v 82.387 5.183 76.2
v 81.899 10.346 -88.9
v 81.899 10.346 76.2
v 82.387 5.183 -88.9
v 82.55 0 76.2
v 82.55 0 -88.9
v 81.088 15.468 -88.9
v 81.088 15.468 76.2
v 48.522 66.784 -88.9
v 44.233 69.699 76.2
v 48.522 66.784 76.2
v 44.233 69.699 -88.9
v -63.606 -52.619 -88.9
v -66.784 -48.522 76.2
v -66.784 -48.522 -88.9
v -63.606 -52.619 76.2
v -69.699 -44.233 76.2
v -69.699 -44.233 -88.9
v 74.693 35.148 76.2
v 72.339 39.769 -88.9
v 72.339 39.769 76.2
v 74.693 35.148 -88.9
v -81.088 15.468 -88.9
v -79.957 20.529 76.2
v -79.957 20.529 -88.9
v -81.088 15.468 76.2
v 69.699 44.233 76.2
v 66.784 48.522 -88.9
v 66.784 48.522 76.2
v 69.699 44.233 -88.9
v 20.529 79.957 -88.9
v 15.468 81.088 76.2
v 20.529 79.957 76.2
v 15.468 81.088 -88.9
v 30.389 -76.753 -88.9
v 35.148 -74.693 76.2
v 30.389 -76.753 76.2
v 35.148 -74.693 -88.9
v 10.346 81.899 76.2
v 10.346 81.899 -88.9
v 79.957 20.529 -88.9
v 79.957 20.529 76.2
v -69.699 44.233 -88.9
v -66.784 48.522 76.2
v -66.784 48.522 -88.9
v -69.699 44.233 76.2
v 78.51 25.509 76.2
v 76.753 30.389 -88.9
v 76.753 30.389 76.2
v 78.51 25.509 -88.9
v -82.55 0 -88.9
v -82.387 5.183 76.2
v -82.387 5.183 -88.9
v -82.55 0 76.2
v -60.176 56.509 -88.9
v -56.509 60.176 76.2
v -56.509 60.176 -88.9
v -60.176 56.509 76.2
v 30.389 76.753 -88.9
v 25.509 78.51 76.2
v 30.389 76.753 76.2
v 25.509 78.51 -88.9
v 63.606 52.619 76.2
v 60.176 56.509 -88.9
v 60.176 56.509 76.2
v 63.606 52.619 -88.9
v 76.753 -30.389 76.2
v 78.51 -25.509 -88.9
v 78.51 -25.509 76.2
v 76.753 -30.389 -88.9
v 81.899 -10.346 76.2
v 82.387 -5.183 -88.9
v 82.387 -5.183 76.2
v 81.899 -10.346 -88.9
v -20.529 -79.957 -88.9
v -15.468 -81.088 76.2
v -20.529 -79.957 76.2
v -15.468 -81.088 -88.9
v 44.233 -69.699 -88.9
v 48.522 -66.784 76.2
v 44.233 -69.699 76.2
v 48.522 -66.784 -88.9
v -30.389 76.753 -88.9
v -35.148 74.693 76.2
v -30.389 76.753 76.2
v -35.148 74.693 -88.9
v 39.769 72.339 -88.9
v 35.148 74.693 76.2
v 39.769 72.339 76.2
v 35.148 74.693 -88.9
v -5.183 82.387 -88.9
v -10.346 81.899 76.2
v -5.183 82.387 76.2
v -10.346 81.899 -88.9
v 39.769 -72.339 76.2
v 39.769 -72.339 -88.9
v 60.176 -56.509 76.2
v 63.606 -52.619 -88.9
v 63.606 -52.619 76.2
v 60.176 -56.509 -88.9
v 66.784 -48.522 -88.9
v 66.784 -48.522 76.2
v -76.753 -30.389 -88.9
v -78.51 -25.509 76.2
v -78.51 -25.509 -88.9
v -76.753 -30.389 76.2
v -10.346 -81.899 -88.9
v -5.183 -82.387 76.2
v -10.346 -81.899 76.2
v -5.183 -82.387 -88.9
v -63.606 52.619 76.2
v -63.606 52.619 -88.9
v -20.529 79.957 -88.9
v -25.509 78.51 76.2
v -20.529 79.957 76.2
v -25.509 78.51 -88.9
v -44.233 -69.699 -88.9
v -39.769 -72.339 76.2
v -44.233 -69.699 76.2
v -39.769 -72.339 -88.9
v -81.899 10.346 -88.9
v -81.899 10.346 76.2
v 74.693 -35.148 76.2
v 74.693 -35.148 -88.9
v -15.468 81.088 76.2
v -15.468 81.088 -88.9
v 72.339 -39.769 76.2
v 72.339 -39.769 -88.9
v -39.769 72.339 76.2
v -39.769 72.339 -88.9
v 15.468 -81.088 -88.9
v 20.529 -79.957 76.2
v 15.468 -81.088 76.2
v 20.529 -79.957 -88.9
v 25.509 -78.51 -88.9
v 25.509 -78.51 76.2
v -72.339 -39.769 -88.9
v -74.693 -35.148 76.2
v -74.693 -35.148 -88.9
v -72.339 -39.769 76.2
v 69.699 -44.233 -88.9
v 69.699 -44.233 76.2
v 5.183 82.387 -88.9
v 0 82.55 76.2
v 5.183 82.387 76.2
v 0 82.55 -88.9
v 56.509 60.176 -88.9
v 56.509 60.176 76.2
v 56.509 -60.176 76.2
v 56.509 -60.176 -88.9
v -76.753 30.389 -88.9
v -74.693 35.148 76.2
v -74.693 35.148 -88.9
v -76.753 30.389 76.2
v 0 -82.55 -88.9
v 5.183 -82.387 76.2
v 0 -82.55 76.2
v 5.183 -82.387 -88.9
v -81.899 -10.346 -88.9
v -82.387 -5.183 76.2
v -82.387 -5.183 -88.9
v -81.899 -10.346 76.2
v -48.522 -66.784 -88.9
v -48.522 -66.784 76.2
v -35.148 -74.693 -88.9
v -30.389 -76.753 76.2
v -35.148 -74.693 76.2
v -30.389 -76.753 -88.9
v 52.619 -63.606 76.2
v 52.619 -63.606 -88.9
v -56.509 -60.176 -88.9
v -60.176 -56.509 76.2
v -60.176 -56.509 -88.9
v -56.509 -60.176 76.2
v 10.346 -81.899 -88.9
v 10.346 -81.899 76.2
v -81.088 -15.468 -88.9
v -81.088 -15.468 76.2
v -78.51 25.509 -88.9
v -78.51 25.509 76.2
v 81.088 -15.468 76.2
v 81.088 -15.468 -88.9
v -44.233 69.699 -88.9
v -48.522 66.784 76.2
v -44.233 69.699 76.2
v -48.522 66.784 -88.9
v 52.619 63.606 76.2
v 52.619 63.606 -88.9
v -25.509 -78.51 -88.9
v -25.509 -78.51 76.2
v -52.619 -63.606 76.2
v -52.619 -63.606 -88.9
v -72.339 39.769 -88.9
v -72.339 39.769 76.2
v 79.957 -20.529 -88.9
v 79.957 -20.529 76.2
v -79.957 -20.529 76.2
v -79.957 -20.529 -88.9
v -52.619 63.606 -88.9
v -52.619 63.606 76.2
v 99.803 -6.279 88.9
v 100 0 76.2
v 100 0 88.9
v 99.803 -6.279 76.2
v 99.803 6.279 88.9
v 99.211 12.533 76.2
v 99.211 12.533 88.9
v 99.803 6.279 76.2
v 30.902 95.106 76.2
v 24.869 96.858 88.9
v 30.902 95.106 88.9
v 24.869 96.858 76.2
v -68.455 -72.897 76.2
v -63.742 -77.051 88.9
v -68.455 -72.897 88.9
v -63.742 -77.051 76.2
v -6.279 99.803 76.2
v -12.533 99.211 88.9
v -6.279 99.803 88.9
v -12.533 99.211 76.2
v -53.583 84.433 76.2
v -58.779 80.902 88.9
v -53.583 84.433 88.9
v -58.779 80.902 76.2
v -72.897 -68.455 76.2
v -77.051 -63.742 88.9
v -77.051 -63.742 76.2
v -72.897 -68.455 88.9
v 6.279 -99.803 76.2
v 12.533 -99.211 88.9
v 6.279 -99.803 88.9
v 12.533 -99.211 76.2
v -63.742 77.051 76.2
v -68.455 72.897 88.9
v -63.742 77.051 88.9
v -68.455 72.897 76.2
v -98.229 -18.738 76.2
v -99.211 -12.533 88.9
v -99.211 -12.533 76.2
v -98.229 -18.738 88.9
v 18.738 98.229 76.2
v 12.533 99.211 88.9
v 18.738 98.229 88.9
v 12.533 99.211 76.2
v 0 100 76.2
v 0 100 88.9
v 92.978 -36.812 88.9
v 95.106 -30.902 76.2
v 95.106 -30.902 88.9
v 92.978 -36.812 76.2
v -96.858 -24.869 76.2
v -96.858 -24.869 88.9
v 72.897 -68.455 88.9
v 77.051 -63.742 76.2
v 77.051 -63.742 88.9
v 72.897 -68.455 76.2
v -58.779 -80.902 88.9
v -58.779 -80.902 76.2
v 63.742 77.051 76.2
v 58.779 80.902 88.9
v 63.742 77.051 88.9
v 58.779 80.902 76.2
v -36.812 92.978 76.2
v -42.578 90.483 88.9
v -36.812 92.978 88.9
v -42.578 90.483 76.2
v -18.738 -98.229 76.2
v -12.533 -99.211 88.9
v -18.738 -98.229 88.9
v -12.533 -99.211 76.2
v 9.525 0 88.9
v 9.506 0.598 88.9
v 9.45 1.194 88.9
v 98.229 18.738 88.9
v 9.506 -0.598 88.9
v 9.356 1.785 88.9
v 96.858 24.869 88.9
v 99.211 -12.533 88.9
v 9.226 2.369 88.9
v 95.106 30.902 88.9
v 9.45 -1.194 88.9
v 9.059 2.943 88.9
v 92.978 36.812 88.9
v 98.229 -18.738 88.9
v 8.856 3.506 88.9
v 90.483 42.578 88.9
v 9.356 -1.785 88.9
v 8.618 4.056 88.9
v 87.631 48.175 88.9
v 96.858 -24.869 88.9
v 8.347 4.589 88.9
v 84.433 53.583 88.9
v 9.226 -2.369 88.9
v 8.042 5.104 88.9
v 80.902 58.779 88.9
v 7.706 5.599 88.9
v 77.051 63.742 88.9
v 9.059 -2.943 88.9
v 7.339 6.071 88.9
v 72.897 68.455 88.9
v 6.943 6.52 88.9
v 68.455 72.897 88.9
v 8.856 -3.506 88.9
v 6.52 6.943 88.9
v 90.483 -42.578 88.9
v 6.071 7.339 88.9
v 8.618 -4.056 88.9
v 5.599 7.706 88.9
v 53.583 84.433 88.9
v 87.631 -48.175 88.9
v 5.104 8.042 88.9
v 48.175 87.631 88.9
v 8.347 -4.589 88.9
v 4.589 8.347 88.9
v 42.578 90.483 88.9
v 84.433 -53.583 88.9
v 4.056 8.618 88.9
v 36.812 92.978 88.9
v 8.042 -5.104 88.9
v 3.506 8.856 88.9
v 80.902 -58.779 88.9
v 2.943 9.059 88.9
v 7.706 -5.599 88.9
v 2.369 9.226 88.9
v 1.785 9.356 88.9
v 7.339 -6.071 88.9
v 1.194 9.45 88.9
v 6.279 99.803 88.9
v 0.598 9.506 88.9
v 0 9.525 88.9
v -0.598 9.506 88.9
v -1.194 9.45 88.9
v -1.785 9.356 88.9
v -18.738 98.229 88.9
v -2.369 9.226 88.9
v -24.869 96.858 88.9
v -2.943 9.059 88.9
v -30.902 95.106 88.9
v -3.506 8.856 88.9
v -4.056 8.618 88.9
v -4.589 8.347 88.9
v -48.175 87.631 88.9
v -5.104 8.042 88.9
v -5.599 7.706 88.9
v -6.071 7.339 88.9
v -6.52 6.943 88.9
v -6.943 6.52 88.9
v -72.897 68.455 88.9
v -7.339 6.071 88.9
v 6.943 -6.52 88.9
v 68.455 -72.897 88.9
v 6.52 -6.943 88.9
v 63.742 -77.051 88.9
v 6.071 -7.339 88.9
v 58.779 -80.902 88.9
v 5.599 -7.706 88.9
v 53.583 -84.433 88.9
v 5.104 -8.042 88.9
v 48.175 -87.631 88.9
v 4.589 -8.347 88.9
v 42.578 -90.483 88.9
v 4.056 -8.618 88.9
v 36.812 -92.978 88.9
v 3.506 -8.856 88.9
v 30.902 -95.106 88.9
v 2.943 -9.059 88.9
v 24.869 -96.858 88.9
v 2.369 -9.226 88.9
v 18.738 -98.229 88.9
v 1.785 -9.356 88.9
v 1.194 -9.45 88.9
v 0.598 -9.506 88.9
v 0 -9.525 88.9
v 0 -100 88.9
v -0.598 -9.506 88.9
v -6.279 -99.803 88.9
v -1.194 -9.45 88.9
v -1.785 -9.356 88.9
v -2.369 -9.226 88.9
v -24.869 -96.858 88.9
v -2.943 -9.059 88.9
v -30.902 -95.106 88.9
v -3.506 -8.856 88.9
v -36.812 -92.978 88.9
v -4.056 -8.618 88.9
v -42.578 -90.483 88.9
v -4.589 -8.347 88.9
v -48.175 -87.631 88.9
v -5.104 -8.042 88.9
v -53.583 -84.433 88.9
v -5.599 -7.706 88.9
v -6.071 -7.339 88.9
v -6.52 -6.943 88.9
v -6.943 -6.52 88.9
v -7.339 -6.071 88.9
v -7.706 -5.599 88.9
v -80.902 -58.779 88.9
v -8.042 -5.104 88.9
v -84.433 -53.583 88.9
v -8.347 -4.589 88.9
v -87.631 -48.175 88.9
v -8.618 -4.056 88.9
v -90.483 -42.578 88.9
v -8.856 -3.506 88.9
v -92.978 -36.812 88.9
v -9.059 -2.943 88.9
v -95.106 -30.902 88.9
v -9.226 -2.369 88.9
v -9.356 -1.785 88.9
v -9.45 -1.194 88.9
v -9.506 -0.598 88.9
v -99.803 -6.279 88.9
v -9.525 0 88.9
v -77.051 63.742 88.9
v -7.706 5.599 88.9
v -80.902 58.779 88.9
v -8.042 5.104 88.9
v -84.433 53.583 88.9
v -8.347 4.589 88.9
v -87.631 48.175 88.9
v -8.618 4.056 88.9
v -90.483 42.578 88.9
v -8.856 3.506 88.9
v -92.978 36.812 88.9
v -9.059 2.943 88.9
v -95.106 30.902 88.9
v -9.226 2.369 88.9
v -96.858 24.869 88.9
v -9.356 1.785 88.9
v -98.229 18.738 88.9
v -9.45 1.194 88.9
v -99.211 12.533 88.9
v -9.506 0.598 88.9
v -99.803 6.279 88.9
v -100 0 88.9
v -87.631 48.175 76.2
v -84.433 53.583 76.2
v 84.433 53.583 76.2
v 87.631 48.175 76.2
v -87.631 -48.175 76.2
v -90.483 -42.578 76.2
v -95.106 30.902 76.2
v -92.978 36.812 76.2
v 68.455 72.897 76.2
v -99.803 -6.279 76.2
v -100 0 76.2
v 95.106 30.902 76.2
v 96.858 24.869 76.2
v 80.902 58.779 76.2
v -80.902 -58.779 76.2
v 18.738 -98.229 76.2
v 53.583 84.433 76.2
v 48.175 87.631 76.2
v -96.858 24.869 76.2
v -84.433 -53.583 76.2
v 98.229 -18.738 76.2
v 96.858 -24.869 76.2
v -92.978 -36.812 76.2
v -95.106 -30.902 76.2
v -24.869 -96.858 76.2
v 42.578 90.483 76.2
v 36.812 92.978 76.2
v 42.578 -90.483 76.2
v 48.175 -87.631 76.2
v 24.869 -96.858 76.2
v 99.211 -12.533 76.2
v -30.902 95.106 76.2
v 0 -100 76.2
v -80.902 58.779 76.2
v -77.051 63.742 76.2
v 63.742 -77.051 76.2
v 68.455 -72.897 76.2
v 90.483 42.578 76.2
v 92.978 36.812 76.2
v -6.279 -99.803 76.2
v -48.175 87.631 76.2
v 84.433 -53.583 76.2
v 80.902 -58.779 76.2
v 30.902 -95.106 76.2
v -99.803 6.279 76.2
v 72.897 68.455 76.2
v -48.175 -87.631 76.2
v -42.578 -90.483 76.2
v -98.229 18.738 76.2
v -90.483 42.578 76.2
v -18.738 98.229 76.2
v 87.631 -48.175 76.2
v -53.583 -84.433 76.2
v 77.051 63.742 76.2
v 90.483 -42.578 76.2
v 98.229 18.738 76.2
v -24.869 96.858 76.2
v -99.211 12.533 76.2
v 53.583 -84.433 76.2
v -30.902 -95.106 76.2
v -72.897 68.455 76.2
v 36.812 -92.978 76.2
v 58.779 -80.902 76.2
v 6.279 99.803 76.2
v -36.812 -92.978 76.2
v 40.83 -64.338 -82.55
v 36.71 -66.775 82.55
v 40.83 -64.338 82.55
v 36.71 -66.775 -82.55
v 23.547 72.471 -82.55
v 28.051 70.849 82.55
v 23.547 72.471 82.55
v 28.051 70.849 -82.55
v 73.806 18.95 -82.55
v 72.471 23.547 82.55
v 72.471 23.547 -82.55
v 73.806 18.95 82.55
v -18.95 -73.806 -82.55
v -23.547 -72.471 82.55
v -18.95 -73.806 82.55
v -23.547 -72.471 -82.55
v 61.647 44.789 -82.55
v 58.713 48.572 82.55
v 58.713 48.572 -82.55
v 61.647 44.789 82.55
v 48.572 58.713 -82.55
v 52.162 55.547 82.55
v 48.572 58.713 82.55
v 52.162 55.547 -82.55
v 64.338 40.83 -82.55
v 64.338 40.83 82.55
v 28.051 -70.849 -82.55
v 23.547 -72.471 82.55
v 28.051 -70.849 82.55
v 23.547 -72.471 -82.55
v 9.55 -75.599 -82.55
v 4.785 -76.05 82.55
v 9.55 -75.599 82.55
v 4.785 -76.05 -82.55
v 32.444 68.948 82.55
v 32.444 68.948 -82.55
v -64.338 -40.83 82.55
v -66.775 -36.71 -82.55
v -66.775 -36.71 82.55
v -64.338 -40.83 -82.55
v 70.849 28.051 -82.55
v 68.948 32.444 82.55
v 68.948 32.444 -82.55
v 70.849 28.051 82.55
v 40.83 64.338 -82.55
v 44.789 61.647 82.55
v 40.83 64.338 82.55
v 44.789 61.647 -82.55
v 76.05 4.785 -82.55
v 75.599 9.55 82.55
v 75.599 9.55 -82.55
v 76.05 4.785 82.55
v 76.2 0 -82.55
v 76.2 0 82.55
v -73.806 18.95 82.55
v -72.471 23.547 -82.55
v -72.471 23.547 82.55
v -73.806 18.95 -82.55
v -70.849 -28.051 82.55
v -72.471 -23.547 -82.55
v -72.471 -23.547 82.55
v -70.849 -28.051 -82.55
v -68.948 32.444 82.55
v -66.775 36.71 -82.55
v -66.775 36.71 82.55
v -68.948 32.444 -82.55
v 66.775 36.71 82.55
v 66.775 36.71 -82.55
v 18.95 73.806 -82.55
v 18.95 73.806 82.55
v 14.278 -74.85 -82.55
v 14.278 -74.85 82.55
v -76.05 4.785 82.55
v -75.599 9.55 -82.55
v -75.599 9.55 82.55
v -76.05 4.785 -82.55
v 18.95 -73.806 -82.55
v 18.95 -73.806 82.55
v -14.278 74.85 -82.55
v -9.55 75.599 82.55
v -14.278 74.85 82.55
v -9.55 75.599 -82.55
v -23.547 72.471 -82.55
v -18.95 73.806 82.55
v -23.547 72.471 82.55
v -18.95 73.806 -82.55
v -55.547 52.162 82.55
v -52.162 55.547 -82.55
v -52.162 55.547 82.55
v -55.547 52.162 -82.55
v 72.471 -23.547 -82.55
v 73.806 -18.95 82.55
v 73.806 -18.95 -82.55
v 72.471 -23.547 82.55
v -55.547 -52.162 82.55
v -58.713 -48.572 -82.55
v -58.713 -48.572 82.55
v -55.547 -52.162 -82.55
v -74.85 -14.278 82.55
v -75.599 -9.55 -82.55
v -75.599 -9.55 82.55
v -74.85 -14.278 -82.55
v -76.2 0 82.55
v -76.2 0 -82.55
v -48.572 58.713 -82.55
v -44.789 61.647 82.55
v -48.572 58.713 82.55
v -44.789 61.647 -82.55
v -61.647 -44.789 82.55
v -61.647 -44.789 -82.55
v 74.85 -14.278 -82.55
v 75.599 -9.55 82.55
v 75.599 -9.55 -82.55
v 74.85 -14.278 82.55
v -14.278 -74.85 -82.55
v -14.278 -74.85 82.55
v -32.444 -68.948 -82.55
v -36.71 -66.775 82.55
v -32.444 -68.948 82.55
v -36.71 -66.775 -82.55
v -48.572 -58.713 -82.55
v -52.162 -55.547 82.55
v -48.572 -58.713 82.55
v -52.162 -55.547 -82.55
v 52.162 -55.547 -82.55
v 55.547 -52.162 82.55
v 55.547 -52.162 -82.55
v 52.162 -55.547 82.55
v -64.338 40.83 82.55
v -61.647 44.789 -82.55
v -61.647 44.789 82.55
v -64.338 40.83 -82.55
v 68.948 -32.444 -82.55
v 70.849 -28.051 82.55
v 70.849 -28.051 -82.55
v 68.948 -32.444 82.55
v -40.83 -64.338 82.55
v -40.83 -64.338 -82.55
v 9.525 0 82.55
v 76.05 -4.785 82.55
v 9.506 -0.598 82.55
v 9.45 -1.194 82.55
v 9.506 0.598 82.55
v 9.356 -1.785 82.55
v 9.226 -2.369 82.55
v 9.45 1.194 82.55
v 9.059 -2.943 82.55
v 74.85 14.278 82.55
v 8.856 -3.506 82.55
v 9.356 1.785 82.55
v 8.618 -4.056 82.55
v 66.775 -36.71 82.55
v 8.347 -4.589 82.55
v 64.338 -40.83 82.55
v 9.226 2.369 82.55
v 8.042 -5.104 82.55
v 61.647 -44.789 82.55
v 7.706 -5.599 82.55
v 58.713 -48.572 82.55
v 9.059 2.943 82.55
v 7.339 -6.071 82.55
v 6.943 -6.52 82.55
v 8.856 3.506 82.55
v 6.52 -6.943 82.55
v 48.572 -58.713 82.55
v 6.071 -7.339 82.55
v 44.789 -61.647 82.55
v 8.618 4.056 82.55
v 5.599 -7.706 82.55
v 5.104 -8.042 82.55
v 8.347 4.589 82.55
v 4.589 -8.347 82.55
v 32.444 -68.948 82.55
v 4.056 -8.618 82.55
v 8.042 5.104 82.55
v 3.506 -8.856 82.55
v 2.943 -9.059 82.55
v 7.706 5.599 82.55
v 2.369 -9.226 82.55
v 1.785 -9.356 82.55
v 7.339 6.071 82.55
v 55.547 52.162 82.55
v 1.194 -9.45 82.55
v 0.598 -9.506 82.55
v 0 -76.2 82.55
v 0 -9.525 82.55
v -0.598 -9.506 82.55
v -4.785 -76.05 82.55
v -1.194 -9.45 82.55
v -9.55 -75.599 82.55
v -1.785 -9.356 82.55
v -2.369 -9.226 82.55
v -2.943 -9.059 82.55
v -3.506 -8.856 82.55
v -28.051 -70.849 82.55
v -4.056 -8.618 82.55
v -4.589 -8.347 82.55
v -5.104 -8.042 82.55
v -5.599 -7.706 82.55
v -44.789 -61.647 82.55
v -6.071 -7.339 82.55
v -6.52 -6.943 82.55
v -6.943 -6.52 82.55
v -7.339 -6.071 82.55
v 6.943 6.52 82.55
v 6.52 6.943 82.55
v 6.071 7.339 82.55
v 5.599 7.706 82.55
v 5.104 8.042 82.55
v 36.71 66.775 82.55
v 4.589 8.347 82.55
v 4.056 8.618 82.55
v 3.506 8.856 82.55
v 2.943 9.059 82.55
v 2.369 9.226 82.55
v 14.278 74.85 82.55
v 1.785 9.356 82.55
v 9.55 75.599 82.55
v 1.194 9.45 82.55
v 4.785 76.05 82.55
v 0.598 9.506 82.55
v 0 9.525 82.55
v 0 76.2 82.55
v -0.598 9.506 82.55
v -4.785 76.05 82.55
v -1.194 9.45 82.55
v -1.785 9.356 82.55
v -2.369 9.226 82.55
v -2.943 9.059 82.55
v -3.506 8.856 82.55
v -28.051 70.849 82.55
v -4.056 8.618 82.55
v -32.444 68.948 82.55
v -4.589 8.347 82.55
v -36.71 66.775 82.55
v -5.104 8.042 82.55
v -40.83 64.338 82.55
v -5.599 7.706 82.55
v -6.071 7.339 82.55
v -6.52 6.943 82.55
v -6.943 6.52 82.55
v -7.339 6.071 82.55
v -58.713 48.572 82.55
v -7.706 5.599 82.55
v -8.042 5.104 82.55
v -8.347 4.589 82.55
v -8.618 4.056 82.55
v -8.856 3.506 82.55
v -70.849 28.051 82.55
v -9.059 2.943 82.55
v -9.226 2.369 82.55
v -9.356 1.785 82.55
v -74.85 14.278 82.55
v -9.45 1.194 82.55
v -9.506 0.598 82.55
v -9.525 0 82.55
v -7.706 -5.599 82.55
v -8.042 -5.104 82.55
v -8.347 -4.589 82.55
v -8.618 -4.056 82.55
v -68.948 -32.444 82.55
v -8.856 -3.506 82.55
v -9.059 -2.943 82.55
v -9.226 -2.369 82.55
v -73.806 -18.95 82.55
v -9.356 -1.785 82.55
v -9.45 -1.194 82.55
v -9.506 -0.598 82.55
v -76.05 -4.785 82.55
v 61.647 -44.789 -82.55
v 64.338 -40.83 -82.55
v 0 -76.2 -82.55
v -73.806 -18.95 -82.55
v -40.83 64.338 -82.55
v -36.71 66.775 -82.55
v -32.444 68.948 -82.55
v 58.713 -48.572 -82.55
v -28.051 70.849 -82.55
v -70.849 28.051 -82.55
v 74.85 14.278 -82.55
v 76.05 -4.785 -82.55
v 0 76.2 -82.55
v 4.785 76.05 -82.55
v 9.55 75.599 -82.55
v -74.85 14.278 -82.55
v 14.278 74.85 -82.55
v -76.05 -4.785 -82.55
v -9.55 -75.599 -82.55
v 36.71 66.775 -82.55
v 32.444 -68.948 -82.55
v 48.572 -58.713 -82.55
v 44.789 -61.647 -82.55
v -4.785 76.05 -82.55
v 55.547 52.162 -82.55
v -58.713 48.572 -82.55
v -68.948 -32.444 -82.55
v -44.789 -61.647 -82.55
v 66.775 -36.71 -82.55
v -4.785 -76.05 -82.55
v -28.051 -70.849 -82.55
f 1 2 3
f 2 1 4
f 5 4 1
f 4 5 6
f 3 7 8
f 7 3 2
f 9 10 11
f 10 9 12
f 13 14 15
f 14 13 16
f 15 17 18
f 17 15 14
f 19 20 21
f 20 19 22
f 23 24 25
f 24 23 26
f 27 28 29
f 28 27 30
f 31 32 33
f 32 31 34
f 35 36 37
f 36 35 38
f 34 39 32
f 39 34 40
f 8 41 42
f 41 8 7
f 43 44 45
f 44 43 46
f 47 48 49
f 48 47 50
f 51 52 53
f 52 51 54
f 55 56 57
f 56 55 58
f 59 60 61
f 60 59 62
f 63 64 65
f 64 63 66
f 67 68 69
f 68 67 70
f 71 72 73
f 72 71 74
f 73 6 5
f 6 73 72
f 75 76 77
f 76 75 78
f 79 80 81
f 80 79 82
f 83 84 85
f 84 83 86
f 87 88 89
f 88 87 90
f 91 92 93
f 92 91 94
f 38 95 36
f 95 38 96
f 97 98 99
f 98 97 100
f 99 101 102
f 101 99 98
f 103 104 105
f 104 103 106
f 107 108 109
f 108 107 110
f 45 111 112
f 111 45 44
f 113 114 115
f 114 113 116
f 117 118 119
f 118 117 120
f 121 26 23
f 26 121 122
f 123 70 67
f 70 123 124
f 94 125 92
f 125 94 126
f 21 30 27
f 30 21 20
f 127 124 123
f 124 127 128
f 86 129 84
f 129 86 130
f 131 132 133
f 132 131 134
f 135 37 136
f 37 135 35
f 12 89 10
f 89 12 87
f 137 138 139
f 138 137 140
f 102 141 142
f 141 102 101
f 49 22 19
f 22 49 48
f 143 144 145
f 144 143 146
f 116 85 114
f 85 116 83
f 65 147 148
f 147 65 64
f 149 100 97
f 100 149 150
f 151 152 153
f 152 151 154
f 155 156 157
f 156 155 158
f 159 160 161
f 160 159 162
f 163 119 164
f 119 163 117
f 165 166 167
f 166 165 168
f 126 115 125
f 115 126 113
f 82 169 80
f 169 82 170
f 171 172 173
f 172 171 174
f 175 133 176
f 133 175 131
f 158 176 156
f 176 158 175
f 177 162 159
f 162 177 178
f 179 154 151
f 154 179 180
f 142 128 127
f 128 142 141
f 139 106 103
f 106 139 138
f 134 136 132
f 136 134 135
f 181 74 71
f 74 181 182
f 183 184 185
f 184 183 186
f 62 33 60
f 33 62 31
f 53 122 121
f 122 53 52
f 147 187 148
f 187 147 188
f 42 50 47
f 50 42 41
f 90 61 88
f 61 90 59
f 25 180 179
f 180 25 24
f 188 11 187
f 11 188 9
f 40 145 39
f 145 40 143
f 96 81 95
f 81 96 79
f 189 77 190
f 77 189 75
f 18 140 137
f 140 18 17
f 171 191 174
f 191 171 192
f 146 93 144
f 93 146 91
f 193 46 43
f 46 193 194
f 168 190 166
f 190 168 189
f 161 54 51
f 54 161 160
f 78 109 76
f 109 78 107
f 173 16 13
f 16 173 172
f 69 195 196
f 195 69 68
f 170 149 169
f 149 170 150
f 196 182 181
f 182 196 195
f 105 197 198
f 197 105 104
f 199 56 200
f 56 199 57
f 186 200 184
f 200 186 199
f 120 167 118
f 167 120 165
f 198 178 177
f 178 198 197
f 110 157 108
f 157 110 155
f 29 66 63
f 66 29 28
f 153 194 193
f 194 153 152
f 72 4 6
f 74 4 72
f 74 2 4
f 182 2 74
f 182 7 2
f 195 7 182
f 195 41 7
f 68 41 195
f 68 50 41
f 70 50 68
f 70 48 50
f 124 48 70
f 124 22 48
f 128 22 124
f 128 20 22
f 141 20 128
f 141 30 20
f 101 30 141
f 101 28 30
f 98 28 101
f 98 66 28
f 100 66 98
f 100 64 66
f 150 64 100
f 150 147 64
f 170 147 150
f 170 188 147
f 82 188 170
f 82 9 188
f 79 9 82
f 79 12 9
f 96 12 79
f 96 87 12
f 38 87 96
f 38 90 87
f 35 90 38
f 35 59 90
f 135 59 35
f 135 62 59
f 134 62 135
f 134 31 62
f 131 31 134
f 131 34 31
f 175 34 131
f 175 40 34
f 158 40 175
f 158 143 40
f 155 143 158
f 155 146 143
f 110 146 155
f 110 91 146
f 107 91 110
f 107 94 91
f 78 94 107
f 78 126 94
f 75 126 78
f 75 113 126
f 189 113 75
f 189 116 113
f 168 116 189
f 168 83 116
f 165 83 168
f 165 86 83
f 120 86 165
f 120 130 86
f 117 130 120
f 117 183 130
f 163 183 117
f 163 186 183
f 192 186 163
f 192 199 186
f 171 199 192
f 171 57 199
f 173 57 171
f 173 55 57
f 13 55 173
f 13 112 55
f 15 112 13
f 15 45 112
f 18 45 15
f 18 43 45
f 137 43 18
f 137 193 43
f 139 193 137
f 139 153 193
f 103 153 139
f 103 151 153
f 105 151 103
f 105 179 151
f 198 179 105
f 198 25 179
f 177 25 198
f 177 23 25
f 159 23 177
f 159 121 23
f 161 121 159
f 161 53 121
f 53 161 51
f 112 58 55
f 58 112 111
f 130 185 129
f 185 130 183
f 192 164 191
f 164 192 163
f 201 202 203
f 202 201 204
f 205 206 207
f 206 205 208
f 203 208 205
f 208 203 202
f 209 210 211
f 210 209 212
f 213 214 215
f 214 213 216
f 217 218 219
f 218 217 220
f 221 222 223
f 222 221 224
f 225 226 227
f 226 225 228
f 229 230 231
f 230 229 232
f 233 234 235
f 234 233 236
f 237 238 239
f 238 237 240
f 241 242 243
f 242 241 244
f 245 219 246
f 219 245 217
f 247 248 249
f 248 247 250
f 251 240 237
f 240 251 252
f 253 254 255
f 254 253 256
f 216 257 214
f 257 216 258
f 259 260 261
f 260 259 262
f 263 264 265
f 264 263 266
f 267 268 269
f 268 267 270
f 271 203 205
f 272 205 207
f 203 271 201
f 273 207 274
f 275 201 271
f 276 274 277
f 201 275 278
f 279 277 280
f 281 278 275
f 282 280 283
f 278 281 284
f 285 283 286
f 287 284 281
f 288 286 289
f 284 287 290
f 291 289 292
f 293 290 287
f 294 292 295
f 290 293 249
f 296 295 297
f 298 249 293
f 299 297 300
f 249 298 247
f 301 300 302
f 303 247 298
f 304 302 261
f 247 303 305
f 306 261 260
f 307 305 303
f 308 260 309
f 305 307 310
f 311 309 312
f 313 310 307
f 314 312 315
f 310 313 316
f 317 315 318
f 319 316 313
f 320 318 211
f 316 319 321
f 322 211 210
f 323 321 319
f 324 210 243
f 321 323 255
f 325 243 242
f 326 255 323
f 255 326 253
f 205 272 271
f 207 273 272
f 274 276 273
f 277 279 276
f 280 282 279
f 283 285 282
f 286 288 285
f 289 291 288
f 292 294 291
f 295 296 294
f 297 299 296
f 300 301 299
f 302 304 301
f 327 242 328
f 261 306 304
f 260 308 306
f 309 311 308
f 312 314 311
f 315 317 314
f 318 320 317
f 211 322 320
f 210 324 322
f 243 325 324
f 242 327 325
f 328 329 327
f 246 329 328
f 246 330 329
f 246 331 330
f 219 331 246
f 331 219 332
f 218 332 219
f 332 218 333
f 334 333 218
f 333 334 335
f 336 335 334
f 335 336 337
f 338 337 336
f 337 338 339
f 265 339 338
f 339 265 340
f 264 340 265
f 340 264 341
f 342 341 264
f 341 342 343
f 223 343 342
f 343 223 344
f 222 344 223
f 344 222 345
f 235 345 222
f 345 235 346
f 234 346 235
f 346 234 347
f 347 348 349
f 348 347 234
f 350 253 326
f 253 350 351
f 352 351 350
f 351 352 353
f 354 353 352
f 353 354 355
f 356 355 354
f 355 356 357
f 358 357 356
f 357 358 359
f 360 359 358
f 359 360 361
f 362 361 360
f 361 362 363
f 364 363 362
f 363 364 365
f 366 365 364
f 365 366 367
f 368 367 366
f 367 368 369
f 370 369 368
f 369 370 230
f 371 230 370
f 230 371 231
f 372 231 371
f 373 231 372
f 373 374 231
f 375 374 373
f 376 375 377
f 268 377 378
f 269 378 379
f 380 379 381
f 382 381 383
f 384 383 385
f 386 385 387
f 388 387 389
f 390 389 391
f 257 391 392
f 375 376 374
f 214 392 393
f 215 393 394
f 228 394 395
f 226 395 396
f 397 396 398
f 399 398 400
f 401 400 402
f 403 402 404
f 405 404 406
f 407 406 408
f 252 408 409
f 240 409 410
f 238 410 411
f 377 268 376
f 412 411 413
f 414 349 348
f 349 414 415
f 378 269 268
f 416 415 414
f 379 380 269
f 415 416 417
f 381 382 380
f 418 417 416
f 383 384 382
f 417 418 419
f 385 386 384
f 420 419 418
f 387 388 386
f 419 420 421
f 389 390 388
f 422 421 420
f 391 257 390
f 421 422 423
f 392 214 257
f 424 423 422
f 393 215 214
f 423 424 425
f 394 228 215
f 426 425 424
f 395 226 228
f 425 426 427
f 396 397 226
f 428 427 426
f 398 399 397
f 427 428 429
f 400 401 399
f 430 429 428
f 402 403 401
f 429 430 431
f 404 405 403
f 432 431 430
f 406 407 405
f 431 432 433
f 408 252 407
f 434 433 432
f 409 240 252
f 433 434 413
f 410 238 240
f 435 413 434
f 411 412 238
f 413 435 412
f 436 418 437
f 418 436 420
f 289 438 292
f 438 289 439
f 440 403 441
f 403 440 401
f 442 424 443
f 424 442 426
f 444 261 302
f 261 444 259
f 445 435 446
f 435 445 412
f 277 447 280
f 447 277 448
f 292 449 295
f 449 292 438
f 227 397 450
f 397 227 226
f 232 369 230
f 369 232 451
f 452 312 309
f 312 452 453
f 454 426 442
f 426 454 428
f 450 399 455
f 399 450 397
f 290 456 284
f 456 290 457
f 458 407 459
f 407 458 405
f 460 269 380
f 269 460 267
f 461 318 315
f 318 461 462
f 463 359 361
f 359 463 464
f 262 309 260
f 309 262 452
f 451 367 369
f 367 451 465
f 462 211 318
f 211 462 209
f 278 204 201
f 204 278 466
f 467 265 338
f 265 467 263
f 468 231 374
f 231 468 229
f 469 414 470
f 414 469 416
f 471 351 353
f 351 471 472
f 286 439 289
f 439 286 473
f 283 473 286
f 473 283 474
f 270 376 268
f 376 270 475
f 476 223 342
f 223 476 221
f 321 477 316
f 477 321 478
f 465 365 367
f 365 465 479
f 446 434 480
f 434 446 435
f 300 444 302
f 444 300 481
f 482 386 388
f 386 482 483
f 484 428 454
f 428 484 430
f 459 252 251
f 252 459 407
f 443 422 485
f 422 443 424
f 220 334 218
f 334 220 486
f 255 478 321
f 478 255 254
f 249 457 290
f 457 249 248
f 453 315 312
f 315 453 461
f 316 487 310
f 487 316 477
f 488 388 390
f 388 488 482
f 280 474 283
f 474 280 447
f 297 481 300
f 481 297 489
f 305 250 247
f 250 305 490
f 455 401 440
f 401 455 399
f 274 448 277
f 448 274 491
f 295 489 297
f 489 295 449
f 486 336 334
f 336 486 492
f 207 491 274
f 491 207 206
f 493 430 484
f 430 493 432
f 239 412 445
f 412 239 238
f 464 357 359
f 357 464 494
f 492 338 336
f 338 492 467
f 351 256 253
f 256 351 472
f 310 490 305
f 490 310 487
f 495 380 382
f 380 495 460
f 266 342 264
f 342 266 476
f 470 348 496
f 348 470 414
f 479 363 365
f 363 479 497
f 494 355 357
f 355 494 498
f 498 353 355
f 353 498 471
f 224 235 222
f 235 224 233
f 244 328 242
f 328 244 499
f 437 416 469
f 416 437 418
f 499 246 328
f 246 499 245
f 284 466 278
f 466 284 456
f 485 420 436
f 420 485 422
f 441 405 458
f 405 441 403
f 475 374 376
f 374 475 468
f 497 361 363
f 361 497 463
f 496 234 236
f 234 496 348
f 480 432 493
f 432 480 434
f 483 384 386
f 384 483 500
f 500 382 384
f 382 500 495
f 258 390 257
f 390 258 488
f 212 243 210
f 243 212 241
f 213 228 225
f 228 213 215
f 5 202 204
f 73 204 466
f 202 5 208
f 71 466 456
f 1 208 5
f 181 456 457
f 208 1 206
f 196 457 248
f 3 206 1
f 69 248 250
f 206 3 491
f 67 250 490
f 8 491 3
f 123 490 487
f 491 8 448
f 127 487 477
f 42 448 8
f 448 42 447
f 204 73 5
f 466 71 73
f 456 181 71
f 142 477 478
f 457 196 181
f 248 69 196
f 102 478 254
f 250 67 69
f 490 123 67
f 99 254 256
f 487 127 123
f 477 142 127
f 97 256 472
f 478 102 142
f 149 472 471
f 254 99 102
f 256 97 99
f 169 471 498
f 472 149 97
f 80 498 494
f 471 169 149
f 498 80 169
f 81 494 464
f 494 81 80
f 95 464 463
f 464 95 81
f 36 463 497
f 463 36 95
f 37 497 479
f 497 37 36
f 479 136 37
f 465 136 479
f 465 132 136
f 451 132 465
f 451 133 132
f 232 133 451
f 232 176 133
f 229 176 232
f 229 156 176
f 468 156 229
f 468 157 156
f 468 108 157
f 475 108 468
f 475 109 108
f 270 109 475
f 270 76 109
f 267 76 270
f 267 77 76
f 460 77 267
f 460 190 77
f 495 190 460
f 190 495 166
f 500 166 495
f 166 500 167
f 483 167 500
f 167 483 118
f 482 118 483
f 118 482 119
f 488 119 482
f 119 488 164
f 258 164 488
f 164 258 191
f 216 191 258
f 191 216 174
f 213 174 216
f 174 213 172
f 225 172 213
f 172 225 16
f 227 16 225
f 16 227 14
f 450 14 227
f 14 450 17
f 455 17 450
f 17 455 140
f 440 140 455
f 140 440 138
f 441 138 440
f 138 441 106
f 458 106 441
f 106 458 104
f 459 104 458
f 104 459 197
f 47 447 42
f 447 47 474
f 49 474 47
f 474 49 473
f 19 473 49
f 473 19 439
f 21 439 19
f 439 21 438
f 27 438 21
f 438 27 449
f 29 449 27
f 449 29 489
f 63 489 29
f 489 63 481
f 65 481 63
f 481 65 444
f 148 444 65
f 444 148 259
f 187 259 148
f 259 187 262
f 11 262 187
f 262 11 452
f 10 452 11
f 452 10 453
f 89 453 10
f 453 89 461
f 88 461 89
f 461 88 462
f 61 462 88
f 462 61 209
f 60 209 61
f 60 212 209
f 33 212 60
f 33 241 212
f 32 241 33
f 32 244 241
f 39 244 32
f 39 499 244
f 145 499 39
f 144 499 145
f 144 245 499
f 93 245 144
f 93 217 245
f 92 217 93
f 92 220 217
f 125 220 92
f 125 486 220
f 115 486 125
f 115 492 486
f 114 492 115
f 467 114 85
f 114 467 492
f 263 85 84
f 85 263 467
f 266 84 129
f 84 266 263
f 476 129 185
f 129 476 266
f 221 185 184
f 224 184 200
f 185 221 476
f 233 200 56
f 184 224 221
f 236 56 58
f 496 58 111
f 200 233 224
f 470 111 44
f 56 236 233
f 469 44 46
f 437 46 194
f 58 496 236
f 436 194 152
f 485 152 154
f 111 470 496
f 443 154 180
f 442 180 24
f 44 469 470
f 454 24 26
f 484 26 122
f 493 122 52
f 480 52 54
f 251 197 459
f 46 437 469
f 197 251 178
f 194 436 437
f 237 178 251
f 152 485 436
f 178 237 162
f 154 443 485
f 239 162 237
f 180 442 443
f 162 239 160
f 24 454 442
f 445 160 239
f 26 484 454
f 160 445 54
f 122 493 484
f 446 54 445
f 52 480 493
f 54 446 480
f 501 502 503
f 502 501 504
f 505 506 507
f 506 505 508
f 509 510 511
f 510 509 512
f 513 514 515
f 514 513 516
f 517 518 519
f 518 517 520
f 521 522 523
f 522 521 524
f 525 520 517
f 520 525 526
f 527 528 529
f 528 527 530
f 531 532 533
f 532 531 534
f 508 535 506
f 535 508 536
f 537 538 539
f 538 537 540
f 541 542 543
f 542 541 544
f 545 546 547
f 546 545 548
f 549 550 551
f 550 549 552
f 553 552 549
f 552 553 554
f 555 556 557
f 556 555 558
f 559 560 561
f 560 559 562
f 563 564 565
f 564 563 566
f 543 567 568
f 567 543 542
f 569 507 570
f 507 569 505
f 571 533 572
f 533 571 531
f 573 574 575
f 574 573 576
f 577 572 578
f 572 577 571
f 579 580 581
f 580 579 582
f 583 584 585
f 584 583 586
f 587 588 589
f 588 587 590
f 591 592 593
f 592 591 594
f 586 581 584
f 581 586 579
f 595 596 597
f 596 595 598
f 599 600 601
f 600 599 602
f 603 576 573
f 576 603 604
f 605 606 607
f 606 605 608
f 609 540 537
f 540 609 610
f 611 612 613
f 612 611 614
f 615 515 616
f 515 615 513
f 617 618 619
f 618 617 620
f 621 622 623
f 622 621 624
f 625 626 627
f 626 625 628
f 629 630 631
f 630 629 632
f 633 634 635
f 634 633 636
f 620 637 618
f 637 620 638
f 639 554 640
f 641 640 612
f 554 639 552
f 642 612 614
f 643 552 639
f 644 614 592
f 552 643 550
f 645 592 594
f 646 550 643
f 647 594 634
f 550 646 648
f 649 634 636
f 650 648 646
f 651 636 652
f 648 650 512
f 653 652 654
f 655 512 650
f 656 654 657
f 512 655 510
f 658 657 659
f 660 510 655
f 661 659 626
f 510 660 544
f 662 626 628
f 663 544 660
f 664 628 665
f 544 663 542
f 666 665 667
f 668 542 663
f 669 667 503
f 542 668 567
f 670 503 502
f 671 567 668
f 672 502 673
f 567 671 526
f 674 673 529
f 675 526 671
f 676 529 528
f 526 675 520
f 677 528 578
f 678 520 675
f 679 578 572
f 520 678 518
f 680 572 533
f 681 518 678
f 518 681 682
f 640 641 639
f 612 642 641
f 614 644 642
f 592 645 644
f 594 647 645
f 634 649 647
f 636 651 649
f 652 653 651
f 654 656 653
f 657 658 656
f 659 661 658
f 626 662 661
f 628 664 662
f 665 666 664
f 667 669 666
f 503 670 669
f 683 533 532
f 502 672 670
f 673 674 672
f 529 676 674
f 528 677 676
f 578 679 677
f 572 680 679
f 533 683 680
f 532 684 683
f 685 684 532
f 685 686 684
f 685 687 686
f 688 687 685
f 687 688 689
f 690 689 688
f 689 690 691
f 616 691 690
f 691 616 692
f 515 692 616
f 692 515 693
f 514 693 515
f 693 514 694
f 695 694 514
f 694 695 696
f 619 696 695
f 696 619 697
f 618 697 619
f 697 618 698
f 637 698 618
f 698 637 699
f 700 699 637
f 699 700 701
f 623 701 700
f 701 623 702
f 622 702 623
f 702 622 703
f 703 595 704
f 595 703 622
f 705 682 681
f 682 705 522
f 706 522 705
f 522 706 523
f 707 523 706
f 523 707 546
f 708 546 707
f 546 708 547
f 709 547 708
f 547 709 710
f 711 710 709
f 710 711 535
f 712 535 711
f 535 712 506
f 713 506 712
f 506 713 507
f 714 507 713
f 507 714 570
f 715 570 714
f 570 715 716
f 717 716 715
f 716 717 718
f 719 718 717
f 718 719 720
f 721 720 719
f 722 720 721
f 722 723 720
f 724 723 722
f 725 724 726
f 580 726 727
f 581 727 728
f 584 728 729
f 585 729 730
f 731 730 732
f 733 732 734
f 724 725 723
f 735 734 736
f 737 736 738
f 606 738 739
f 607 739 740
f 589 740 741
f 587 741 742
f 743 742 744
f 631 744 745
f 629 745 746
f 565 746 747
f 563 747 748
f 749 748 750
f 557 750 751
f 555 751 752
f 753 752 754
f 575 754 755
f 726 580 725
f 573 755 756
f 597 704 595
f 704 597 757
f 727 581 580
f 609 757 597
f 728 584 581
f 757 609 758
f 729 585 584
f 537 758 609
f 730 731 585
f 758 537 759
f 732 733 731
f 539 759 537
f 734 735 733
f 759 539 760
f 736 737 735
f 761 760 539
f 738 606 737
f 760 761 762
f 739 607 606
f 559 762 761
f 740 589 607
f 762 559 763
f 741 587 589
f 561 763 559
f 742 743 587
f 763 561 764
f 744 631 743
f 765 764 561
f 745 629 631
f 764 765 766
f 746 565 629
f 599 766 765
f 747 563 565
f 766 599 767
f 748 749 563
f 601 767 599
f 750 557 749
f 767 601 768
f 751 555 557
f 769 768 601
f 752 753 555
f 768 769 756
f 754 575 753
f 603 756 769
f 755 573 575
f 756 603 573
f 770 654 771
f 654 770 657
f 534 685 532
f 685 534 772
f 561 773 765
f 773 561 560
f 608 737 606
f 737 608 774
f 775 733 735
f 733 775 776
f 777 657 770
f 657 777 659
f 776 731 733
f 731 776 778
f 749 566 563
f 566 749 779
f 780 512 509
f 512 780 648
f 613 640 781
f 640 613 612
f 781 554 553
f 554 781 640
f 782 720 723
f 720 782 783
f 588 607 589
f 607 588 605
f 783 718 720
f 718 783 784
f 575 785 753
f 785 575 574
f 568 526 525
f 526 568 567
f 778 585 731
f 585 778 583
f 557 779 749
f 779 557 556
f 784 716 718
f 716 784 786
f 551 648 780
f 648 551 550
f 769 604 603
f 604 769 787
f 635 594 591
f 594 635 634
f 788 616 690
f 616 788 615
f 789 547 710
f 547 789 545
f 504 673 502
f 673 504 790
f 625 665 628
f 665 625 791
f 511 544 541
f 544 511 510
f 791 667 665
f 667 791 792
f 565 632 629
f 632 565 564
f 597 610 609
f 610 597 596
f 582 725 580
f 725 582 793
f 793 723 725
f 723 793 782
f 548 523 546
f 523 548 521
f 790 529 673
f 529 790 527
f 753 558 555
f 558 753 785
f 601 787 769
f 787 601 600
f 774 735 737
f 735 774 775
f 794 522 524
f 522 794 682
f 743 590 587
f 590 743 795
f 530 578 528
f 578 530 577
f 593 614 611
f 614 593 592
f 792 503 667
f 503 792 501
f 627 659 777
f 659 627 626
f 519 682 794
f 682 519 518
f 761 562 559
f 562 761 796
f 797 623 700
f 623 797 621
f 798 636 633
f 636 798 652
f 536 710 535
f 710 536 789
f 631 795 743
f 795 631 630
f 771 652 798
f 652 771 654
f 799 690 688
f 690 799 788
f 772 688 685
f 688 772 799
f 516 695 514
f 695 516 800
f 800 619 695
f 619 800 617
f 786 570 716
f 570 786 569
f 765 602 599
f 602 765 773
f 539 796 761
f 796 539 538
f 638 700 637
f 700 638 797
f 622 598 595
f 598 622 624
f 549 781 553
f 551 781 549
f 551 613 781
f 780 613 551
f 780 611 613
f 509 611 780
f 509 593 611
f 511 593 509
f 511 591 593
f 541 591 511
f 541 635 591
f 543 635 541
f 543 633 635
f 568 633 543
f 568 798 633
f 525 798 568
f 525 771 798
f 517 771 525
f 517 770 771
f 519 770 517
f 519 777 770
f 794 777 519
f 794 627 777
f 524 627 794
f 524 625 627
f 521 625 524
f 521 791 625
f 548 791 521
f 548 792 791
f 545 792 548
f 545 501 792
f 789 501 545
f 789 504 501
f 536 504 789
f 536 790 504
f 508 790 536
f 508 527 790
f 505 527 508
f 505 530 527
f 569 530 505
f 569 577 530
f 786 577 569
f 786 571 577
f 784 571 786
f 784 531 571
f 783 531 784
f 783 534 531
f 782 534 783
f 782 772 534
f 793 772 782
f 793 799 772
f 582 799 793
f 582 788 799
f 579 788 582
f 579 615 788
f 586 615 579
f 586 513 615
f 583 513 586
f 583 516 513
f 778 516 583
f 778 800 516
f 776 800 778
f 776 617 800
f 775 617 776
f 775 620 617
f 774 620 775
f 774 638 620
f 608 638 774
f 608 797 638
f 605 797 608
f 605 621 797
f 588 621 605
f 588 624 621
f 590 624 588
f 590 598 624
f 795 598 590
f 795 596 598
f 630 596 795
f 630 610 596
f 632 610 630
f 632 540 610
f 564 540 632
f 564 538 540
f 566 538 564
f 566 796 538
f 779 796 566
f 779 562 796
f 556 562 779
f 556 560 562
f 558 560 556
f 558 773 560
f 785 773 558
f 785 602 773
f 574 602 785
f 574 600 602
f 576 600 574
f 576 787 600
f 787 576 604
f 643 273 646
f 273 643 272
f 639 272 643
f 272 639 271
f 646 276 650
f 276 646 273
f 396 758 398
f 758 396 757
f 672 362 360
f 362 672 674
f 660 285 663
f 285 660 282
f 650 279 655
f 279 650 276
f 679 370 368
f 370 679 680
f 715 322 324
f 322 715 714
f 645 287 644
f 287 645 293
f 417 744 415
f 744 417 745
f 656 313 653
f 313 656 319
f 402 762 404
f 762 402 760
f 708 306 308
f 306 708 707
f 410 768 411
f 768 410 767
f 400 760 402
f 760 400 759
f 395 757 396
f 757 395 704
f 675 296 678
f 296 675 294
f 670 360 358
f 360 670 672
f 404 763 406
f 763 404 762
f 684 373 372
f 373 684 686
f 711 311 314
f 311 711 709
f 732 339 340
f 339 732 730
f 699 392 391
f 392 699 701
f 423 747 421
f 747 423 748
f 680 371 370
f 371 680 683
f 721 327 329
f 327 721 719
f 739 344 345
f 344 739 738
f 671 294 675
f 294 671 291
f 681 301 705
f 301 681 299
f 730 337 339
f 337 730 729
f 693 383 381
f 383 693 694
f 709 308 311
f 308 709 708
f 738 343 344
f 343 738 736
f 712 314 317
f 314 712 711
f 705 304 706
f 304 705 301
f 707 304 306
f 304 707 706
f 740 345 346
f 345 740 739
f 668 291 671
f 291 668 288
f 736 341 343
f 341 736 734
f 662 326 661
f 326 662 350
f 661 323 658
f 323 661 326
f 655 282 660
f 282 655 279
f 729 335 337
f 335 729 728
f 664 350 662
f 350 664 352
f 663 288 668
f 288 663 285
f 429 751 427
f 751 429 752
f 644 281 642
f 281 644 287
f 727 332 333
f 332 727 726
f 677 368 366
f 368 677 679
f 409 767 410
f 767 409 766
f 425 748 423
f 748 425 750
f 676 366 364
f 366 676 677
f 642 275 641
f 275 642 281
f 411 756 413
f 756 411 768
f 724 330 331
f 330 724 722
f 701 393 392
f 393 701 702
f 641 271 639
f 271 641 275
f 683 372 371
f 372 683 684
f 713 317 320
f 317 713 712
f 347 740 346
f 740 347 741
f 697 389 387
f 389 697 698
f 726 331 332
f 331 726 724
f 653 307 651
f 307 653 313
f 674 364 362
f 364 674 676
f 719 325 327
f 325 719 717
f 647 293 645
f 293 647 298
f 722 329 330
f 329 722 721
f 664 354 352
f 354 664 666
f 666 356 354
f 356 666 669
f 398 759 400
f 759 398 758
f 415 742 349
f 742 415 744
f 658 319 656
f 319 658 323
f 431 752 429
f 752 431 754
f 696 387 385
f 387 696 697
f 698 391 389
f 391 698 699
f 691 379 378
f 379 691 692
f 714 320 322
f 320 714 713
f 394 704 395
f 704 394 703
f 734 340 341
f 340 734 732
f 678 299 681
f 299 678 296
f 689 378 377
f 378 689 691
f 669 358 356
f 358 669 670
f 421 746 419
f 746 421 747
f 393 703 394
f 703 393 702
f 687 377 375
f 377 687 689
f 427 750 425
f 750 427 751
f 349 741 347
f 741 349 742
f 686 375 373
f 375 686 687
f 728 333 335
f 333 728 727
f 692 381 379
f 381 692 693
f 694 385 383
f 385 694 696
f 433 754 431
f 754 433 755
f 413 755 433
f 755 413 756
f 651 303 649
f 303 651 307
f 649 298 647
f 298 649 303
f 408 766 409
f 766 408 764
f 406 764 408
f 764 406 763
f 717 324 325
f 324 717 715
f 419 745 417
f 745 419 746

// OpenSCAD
$fn = 100;
in = 25.4;

chamberOD = 6.5*in;
chamberID = 6.0*in;

chamberOuterHeight = 6.75*in;
chamberInnerHeight = 6.5*in;  // No top

flangeOD = 200;
t = 0.25*in;
passThroughOD = 0.75*in;

showCutaway = false;

module chamber()
{
    translate([0,0,-t-chamberInnerHeight/2])
    difference()
    {
        union()
        {
            cylinder(r=chamberOD/2,h=chamberOuterHeight);
            translate([0,0,chamberInnerHeight])
            cylinder(r=flangeOD/2,h=2*t);
        }
        translate([0,0,t])
        cylinder(r=chamberID/2,h=chamberInnerHeight);
        translate([0,0,chamberInnerHeight])
        cylinder(r=passThroughOD/2,h=3*t);
    }
}

if (showCutaway)
{
    intersection()
    {
        s = 2*chamberOuterHeight;
        translate([-s,-s/2,-s/2])
        cube(s);
        chamber();
    }
}
else
{
    chamber();
}
